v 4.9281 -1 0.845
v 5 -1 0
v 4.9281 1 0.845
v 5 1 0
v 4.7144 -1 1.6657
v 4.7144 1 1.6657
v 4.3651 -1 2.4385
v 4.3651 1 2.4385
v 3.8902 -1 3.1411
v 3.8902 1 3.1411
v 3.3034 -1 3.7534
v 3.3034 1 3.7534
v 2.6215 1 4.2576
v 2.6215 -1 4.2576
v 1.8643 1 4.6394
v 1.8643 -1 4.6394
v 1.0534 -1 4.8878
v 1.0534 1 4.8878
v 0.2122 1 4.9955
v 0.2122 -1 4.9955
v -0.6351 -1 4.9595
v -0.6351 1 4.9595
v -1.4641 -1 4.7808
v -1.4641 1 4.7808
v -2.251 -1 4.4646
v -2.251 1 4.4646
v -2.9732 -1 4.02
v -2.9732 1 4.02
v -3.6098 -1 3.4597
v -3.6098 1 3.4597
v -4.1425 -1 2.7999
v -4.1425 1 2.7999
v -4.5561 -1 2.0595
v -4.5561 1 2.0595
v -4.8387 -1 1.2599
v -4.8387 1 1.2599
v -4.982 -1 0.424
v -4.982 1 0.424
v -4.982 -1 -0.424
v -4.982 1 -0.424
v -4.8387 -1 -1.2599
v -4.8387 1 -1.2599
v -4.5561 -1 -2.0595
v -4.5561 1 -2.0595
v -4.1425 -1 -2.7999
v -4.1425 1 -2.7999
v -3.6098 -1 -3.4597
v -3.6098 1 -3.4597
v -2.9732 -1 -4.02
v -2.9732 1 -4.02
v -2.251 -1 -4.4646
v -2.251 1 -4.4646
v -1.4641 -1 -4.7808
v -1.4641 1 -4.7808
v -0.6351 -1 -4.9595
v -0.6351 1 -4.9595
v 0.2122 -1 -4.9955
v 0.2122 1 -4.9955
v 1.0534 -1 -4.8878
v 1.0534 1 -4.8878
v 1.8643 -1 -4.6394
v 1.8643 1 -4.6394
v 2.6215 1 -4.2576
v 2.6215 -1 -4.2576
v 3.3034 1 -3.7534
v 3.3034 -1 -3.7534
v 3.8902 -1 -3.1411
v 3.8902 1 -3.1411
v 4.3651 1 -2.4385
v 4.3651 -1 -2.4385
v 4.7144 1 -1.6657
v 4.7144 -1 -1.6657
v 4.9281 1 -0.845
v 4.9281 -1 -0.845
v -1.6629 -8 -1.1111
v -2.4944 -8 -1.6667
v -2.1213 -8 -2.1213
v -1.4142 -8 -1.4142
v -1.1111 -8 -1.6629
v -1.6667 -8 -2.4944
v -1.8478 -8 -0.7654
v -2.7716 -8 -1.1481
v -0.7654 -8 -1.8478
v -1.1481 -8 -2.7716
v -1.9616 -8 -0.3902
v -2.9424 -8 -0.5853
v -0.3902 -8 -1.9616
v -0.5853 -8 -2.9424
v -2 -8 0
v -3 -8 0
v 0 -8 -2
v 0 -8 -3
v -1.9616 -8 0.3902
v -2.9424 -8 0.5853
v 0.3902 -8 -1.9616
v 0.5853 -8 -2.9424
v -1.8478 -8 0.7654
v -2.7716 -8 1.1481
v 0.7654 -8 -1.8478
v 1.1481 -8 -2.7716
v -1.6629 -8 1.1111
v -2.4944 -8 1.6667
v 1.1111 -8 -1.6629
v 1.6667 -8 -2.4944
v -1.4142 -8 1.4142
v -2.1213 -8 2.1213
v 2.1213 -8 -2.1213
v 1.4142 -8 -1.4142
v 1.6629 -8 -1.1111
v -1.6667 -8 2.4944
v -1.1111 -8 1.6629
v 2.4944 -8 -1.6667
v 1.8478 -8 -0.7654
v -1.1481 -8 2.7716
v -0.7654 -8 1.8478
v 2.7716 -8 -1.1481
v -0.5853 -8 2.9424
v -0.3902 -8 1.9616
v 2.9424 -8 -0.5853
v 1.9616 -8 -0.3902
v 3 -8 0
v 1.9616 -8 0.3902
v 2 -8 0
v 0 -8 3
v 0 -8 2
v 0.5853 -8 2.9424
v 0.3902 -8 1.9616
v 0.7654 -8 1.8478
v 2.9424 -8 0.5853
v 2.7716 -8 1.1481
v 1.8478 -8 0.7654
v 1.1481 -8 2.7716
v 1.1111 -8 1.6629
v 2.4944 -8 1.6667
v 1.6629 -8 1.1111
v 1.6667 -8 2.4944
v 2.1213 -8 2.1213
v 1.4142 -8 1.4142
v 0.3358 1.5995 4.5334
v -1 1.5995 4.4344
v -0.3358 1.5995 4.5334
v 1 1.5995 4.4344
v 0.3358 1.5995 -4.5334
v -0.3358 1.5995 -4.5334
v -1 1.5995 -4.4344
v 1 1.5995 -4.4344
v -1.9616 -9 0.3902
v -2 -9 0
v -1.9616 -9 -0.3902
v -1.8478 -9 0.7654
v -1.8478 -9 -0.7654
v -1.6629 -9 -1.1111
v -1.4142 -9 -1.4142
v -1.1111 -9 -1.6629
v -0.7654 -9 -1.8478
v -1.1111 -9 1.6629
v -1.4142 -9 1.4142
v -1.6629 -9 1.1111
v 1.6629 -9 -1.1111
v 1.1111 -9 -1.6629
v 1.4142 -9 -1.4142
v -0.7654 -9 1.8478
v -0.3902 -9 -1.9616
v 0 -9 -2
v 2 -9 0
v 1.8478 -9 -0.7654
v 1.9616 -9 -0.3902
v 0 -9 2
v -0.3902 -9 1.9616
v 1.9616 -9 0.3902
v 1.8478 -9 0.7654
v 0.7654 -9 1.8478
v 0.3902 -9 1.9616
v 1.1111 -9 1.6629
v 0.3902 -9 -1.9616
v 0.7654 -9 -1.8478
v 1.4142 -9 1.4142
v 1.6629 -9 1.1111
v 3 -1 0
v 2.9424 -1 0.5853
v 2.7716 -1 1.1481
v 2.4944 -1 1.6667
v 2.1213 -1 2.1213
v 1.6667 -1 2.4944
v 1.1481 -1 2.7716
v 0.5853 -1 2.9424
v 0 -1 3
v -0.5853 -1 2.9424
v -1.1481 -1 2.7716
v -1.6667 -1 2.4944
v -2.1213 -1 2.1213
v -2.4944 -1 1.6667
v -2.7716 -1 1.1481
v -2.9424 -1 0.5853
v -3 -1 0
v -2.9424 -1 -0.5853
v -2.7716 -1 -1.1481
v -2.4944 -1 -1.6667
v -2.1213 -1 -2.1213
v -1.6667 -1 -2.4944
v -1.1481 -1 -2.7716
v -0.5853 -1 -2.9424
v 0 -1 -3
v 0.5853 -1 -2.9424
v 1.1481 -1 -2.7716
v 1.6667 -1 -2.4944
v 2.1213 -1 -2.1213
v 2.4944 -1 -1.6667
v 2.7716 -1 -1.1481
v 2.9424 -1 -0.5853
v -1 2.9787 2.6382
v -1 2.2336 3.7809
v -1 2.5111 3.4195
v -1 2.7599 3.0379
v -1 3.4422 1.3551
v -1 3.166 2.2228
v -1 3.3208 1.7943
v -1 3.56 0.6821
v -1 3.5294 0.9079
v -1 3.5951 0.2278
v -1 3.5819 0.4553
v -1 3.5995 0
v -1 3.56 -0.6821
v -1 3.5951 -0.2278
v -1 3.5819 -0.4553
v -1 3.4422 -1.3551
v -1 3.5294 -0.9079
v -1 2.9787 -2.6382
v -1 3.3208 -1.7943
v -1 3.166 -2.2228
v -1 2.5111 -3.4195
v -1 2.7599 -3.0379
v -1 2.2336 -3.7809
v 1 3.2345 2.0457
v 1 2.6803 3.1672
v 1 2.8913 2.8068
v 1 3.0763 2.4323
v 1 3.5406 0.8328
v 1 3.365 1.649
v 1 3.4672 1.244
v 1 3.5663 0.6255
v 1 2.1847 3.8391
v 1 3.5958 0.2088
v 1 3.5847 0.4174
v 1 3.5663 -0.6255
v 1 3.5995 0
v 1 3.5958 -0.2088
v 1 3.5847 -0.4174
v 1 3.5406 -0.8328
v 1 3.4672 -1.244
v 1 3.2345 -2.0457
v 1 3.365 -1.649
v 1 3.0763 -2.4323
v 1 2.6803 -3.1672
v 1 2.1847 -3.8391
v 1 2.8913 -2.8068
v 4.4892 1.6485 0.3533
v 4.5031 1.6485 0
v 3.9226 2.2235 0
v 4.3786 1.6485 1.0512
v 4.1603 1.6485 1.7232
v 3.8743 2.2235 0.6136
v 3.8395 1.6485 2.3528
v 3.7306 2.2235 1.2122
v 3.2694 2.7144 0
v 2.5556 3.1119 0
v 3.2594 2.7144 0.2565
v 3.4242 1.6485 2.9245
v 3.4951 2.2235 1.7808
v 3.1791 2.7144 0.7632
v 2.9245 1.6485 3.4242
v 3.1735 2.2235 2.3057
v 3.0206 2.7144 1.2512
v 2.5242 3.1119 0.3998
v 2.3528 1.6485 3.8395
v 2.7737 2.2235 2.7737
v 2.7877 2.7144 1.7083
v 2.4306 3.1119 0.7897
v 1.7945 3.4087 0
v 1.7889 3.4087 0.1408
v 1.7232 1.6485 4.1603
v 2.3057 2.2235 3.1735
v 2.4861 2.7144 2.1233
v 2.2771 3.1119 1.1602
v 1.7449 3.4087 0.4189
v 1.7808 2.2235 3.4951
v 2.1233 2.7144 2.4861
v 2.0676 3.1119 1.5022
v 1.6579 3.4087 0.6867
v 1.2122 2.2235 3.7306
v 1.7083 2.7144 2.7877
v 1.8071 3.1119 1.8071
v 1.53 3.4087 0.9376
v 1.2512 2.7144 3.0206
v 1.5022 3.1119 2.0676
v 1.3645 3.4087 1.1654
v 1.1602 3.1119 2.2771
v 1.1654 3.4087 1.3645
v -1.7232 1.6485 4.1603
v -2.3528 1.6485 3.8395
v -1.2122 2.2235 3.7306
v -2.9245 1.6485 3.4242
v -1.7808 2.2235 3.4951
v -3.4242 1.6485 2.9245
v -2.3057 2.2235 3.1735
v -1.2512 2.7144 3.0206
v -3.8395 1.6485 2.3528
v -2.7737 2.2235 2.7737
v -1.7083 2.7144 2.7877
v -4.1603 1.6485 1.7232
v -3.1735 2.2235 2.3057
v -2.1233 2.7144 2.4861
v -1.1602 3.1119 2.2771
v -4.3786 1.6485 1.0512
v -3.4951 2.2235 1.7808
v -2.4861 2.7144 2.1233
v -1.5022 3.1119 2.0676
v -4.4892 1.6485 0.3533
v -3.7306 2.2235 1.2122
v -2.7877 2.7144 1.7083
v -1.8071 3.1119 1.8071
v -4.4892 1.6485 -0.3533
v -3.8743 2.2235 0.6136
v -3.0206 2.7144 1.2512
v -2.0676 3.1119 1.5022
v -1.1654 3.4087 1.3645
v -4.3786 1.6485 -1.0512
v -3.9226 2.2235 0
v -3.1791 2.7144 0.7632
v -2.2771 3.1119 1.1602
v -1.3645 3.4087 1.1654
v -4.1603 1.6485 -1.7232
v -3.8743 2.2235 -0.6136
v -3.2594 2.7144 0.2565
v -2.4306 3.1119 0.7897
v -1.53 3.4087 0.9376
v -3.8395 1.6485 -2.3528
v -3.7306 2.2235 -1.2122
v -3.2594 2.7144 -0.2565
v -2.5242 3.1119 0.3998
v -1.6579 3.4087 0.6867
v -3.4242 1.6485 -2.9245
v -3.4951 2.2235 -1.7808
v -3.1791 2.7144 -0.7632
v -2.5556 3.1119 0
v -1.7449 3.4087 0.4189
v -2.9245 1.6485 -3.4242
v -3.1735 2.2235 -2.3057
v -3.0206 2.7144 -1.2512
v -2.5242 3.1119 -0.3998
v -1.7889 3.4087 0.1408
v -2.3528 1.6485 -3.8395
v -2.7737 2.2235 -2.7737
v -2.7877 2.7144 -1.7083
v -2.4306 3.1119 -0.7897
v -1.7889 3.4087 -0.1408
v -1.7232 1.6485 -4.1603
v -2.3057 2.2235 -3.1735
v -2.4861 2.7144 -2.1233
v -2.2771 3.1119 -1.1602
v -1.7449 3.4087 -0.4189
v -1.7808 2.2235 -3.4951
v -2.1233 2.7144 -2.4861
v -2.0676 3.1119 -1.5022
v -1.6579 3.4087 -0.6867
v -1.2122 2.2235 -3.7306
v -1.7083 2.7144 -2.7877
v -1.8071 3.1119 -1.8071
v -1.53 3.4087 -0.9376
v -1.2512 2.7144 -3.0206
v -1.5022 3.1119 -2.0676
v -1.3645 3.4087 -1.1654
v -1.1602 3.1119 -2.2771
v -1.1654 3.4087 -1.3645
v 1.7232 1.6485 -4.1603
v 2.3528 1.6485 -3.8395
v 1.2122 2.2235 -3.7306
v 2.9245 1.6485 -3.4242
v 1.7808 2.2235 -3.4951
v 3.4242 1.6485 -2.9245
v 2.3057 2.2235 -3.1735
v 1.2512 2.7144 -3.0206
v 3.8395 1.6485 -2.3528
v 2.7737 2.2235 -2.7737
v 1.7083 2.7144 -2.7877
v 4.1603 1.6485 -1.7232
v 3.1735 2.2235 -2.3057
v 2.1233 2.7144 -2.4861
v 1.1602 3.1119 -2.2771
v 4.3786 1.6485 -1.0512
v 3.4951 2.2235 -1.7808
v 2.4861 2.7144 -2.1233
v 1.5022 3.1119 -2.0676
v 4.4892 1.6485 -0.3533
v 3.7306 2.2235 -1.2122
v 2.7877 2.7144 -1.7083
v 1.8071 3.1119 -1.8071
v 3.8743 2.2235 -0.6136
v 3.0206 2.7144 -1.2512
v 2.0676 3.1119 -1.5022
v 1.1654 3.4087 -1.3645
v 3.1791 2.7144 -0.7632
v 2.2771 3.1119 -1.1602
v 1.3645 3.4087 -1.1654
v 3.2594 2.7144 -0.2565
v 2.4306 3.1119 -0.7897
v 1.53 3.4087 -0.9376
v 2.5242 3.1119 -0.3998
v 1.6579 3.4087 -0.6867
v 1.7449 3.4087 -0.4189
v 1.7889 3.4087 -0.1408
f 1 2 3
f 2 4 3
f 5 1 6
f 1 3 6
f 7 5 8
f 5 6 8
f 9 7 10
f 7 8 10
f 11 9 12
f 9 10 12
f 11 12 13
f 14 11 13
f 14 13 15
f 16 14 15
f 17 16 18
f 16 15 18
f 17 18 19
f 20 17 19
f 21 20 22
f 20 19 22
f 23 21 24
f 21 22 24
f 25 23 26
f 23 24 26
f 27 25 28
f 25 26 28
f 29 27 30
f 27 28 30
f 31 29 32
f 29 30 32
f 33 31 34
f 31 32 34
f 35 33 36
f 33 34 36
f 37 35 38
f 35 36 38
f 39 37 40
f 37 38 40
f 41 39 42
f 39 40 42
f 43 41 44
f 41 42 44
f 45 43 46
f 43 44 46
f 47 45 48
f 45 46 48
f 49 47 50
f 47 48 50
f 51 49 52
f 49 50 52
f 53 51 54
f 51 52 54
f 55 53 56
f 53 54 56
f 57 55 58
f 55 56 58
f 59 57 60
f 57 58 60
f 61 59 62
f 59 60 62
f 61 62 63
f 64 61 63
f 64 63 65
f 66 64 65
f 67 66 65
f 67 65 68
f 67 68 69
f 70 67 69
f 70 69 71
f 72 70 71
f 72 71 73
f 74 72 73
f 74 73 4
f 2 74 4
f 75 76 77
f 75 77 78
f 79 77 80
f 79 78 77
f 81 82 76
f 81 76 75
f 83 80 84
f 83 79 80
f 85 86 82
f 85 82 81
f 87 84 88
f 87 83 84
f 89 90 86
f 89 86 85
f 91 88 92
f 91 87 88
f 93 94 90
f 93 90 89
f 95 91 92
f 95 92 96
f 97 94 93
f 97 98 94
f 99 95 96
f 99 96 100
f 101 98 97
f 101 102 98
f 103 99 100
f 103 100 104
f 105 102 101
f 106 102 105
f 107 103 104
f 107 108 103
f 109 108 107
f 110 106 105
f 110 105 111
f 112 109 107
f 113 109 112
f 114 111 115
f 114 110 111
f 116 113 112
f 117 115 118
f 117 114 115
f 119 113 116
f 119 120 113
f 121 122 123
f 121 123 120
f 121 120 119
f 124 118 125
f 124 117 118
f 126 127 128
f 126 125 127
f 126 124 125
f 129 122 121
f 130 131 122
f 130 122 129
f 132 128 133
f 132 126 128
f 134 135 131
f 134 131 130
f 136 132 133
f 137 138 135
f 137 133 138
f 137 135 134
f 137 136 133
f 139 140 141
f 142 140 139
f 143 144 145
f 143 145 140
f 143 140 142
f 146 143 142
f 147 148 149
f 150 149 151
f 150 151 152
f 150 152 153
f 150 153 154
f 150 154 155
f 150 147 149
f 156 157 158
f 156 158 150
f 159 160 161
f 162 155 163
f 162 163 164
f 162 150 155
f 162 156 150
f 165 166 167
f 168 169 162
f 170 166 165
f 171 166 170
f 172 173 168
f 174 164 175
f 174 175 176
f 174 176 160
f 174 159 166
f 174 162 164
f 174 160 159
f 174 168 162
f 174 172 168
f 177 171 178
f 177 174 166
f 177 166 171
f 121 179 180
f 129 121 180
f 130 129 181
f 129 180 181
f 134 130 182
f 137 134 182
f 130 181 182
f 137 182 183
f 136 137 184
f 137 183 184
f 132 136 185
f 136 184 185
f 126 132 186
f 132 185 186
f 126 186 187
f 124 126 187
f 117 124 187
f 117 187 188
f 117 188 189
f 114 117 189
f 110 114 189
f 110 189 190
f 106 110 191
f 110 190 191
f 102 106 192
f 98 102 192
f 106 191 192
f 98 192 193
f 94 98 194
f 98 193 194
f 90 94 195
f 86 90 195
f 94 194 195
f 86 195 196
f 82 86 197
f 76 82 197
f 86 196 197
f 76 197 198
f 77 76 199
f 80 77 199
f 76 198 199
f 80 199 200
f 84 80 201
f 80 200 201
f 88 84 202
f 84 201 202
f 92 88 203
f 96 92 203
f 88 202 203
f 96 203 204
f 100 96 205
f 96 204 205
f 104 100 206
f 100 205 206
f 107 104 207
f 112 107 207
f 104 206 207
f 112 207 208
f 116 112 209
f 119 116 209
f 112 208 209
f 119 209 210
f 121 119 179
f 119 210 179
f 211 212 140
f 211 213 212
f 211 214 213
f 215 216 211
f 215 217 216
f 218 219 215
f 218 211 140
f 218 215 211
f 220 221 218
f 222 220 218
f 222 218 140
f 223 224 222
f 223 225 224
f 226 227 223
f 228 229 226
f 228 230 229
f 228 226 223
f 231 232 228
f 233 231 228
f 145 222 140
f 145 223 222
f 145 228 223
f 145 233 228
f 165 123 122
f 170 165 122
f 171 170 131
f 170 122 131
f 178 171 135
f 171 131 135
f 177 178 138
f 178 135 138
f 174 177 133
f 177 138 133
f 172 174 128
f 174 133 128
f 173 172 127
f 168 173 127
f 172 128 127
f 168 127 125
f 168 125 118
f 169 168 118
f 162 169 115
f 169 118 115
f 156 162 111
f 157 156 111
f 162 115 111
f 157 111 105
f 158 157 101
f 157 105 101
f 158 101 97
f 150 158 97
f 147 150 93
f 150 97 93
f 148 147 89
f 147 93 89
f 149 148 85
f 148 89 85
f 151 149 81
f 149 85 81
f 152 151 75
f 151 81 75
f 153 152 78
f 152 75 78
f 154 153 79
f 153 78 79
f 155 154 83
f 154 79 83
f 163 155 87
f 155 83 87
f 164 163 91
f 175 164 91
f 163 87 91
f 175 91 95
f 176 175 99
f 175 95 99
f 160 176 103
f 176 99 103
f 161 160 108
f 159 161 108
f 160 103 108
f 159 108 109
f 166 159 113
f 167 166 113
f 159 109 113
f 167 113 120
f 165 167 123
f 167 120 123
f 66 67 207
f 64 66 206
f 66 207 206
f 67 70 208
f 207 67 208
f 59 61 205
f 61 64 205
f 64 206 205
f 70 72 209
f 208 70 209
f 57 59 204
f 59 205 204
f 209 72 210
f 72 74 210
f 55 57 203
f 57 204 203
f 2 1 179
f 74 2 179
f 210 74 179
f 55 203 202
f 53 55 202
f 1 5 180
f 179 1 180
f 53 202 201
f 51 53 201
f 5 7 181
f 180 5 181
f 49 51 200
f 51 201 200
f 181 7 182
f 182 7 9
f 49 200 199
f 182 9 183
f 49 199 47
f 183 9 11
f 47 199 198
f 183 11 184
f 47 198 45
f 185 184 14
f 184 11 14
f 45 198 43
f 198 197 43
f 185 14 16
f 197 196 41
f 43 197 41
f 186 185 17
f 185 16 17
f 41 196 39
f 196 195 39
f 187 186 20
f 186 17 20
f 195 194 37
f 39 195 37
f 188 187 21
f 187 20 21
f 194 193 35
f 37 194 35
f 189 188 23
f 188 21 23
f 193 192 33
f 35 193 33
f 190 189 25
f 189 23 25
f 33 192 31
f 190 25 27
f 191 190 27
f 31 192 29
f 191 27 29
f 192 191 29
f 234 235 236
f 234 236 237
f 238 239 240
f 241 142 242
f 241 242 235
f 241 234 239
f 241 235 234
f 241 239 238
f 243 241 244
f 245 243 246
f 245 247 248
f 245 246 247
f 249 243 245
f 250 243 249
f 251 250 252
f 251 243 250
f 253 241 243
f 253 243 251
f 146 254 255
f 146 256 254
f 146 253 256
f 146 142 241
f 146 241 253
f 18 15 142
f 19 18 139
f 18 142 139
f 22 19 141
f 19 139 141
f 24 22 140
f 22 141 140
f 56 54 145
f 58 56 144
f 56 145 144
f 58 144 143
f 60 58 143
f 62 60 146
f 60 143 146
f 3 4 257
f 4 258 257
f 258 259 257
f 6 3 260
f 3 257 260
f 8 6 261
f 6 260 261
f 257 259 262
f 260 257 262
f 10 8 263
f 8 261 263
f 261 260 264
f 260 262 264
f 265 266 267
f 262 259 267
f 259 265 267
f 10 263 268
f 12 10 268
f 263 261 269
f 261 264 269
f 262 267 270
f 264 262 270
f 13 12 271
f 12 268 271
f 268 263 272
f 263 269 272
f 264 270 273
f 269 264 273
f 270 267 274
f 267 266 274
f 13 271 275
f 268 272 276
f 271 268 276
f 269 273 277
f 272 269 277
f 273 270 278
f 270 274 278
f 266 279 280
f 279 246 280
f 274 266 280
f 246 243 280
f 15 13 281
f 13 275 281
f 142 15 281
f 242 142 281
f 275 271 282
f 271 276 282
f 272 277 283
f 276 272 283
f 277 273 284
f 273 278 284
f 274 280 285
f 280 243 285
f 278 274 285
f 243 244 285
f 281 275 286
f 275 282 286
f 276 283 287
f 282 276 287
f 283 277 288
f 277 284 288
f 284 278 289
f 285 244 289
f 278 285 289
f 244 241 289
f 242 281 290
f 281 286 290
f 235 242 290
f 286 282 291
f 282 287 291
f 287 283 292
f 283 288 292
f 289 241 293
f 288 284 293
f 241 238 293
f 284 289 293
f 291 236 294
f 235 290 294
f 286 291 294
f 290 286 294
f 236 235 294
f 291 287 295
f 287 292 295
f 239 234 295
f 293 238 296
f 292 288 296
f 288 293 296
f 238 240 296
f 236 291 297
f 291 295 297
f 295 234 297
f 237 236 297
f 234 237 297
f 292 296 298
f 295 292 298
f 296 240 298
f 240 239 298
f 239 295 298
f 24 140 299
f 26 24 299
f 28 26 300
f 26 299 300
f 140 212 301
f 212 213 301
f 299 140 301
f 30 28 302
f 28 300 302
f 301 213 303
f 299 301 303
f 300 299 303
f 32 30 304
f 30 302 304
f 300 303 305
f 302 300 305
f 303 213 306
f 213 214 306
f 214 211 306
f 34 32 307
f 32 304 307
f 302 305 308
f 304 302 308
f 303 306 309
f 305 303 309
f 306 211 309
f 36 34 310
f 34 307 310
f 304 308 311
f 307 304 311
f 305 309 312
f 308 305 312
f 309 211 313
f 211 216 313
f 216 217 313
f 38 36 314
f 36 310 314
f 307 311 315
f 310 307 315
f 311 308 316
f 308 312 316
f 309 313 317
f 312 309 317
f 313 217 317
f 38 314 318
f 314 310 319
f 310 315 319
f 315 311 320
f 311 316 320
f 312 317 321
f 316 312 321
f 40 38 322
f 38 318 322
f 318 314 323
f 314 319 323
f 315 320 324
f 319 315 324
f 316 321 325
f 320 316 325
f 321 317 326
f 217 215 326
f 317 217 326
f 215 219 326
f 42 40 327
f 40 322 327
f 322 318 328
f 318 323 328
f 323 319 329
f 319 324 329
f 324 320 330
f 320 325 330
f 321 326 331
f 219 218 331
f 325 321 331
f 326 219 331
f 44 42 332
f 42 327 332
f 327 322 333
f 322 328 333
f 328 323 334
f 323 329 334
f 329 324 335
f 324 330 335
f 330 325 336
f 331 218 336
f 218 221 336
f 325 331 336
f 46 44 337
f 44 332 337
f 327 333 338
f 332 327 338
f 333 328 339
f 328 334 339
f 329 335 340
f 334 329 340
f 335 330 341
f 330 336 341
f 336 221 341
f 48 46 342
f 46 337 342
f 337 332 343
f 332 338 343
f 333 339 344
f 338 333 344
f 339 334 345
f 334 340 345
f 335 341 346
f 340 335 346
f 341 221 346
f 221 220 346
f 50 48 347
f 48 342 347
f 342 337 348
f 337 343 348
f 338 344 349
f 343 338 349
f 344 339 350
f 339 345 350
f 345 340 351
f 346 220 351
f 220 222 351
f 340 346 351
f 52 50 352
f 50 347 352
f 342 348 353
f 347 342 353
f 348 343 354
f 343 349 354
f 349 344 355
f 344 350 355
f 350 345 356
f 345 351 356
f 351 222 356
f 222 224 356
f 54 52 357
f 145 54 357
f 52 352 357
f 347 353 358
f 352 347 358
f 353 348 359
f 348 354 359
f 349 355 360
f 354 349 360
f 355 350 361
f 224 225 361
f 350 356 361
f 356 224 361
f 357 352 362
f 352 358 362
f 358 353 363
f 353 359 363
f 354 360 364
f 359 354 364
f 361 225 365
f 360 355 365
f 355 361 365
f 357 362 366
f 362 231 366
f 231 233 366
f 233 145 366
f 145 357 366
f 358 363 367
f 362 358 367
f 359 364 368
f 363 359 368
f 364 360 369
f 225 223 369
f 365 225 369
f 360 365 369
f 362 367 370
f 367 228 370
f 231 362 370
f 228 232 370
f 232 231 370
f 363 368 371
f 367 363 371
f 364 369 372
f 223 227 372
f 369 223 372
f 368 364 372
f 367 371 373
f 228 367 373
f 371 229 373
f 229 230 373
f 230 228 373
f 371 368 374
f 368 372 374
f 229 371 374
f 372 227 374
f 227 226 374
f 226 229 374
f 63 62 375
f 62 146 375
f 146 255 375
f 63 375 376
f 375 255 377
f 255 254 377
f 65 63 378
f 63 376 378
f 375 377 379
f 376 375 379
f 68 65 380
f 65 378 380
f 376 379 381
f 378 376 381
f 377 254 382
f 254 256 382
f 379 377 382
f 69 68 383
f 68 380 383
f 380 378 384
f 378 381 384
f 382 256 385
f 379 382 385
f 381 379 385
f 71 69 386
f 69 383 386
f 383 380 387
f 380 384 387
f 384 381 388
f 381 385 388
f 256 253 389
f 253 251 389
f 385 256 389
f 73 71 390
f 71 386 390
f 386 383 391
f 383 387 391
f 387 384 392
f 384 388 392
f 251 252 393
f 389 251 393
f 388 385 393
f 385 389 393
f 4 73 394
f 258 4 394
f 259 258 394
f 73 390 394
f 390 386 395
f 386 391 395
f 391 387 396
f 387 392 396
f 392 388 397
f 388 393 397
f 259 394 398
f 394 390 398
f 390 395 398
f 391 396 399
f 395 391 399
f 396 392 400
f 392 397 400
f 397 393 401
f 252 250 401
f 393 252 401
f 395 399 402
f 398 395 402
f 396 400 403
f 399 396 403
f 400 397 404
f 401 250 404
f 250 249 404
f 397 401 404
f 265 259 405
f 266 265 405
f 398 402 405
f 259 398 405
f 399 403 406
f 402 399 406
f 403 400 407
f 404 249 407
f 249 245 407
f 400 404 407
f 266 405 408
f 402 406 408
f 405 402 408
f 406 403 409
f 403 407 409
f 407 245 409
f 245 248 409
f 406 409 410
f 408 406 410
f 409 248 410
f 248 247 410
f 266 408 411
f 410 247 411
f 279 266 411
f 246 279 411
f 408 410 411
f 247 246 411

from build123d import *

# Parameters (mm, degrees)
CUT_EXTRUDE5_DEPTH      = 6
CUT_EXTRUDE5_DEPTH_BACK = 6
SKETCH3_R               = 3
BOSS_EXTRUDE1_DEPTH     = 7
SKETCH4_R               = 2
BOSS_EXTRUDE2_DEPTH     = 1


with BuildPart() as part:
    # Sketch1 → Revolve1 (revolve)
    with BuildSketch(Plane.XY):
        with BuildLine():
            Line((0, -1), (5, -1))
            Line((5, -1), (5, 1))
            ThreePointArc((5, 1), (2.837274331, 2.970139283), (0, 3.68337521))
            Line((0, 3.68337521), (0, -1))
        make_face()
    revolve(axis=Axis((0, 3.68337521, 0), (0, -1, 0)))

    # Sketch2 → Cut-Extrude5 (cut, two sides)
    with BuildSketch(Plane.XY) as cut_extrude5_sk:
        Polygon((-1, 28.719638355), (-1, 3.599454993), (-1, 1.599454993), (1, 1.599454993), (1, 3.599454993), (1, 28.719638355), (1, 78.960005081), (-1, 78.960005081), align=None)
    extrude(amount=CUT_EXTRUDE5_DEPTH, mode=Mode.SUBTRACT)
    extrude(cut_extrude5_sk.sketch, amount=-CUT_EXTRUDE5_DEPTH_BACK, mode=Mode.SUBTRACT)

    # Sketch3 → Boss-Extrude1 (add)
    with BuildSketch(Plane.XZ.offset(1)):
        Circle(SKETCH3_R)
    extrude(amount=BOSS_EXTRUDE1_DEPTH)

    # Sketch4 → Boss-Extrude2 (add)
    with BuildSketch(Plane.XZ.offset(8)):
        Circle(SKETCH4_R)
    extrude(amount=BOSS_EXTRUDE2_DEPTH)


solid = part.part
